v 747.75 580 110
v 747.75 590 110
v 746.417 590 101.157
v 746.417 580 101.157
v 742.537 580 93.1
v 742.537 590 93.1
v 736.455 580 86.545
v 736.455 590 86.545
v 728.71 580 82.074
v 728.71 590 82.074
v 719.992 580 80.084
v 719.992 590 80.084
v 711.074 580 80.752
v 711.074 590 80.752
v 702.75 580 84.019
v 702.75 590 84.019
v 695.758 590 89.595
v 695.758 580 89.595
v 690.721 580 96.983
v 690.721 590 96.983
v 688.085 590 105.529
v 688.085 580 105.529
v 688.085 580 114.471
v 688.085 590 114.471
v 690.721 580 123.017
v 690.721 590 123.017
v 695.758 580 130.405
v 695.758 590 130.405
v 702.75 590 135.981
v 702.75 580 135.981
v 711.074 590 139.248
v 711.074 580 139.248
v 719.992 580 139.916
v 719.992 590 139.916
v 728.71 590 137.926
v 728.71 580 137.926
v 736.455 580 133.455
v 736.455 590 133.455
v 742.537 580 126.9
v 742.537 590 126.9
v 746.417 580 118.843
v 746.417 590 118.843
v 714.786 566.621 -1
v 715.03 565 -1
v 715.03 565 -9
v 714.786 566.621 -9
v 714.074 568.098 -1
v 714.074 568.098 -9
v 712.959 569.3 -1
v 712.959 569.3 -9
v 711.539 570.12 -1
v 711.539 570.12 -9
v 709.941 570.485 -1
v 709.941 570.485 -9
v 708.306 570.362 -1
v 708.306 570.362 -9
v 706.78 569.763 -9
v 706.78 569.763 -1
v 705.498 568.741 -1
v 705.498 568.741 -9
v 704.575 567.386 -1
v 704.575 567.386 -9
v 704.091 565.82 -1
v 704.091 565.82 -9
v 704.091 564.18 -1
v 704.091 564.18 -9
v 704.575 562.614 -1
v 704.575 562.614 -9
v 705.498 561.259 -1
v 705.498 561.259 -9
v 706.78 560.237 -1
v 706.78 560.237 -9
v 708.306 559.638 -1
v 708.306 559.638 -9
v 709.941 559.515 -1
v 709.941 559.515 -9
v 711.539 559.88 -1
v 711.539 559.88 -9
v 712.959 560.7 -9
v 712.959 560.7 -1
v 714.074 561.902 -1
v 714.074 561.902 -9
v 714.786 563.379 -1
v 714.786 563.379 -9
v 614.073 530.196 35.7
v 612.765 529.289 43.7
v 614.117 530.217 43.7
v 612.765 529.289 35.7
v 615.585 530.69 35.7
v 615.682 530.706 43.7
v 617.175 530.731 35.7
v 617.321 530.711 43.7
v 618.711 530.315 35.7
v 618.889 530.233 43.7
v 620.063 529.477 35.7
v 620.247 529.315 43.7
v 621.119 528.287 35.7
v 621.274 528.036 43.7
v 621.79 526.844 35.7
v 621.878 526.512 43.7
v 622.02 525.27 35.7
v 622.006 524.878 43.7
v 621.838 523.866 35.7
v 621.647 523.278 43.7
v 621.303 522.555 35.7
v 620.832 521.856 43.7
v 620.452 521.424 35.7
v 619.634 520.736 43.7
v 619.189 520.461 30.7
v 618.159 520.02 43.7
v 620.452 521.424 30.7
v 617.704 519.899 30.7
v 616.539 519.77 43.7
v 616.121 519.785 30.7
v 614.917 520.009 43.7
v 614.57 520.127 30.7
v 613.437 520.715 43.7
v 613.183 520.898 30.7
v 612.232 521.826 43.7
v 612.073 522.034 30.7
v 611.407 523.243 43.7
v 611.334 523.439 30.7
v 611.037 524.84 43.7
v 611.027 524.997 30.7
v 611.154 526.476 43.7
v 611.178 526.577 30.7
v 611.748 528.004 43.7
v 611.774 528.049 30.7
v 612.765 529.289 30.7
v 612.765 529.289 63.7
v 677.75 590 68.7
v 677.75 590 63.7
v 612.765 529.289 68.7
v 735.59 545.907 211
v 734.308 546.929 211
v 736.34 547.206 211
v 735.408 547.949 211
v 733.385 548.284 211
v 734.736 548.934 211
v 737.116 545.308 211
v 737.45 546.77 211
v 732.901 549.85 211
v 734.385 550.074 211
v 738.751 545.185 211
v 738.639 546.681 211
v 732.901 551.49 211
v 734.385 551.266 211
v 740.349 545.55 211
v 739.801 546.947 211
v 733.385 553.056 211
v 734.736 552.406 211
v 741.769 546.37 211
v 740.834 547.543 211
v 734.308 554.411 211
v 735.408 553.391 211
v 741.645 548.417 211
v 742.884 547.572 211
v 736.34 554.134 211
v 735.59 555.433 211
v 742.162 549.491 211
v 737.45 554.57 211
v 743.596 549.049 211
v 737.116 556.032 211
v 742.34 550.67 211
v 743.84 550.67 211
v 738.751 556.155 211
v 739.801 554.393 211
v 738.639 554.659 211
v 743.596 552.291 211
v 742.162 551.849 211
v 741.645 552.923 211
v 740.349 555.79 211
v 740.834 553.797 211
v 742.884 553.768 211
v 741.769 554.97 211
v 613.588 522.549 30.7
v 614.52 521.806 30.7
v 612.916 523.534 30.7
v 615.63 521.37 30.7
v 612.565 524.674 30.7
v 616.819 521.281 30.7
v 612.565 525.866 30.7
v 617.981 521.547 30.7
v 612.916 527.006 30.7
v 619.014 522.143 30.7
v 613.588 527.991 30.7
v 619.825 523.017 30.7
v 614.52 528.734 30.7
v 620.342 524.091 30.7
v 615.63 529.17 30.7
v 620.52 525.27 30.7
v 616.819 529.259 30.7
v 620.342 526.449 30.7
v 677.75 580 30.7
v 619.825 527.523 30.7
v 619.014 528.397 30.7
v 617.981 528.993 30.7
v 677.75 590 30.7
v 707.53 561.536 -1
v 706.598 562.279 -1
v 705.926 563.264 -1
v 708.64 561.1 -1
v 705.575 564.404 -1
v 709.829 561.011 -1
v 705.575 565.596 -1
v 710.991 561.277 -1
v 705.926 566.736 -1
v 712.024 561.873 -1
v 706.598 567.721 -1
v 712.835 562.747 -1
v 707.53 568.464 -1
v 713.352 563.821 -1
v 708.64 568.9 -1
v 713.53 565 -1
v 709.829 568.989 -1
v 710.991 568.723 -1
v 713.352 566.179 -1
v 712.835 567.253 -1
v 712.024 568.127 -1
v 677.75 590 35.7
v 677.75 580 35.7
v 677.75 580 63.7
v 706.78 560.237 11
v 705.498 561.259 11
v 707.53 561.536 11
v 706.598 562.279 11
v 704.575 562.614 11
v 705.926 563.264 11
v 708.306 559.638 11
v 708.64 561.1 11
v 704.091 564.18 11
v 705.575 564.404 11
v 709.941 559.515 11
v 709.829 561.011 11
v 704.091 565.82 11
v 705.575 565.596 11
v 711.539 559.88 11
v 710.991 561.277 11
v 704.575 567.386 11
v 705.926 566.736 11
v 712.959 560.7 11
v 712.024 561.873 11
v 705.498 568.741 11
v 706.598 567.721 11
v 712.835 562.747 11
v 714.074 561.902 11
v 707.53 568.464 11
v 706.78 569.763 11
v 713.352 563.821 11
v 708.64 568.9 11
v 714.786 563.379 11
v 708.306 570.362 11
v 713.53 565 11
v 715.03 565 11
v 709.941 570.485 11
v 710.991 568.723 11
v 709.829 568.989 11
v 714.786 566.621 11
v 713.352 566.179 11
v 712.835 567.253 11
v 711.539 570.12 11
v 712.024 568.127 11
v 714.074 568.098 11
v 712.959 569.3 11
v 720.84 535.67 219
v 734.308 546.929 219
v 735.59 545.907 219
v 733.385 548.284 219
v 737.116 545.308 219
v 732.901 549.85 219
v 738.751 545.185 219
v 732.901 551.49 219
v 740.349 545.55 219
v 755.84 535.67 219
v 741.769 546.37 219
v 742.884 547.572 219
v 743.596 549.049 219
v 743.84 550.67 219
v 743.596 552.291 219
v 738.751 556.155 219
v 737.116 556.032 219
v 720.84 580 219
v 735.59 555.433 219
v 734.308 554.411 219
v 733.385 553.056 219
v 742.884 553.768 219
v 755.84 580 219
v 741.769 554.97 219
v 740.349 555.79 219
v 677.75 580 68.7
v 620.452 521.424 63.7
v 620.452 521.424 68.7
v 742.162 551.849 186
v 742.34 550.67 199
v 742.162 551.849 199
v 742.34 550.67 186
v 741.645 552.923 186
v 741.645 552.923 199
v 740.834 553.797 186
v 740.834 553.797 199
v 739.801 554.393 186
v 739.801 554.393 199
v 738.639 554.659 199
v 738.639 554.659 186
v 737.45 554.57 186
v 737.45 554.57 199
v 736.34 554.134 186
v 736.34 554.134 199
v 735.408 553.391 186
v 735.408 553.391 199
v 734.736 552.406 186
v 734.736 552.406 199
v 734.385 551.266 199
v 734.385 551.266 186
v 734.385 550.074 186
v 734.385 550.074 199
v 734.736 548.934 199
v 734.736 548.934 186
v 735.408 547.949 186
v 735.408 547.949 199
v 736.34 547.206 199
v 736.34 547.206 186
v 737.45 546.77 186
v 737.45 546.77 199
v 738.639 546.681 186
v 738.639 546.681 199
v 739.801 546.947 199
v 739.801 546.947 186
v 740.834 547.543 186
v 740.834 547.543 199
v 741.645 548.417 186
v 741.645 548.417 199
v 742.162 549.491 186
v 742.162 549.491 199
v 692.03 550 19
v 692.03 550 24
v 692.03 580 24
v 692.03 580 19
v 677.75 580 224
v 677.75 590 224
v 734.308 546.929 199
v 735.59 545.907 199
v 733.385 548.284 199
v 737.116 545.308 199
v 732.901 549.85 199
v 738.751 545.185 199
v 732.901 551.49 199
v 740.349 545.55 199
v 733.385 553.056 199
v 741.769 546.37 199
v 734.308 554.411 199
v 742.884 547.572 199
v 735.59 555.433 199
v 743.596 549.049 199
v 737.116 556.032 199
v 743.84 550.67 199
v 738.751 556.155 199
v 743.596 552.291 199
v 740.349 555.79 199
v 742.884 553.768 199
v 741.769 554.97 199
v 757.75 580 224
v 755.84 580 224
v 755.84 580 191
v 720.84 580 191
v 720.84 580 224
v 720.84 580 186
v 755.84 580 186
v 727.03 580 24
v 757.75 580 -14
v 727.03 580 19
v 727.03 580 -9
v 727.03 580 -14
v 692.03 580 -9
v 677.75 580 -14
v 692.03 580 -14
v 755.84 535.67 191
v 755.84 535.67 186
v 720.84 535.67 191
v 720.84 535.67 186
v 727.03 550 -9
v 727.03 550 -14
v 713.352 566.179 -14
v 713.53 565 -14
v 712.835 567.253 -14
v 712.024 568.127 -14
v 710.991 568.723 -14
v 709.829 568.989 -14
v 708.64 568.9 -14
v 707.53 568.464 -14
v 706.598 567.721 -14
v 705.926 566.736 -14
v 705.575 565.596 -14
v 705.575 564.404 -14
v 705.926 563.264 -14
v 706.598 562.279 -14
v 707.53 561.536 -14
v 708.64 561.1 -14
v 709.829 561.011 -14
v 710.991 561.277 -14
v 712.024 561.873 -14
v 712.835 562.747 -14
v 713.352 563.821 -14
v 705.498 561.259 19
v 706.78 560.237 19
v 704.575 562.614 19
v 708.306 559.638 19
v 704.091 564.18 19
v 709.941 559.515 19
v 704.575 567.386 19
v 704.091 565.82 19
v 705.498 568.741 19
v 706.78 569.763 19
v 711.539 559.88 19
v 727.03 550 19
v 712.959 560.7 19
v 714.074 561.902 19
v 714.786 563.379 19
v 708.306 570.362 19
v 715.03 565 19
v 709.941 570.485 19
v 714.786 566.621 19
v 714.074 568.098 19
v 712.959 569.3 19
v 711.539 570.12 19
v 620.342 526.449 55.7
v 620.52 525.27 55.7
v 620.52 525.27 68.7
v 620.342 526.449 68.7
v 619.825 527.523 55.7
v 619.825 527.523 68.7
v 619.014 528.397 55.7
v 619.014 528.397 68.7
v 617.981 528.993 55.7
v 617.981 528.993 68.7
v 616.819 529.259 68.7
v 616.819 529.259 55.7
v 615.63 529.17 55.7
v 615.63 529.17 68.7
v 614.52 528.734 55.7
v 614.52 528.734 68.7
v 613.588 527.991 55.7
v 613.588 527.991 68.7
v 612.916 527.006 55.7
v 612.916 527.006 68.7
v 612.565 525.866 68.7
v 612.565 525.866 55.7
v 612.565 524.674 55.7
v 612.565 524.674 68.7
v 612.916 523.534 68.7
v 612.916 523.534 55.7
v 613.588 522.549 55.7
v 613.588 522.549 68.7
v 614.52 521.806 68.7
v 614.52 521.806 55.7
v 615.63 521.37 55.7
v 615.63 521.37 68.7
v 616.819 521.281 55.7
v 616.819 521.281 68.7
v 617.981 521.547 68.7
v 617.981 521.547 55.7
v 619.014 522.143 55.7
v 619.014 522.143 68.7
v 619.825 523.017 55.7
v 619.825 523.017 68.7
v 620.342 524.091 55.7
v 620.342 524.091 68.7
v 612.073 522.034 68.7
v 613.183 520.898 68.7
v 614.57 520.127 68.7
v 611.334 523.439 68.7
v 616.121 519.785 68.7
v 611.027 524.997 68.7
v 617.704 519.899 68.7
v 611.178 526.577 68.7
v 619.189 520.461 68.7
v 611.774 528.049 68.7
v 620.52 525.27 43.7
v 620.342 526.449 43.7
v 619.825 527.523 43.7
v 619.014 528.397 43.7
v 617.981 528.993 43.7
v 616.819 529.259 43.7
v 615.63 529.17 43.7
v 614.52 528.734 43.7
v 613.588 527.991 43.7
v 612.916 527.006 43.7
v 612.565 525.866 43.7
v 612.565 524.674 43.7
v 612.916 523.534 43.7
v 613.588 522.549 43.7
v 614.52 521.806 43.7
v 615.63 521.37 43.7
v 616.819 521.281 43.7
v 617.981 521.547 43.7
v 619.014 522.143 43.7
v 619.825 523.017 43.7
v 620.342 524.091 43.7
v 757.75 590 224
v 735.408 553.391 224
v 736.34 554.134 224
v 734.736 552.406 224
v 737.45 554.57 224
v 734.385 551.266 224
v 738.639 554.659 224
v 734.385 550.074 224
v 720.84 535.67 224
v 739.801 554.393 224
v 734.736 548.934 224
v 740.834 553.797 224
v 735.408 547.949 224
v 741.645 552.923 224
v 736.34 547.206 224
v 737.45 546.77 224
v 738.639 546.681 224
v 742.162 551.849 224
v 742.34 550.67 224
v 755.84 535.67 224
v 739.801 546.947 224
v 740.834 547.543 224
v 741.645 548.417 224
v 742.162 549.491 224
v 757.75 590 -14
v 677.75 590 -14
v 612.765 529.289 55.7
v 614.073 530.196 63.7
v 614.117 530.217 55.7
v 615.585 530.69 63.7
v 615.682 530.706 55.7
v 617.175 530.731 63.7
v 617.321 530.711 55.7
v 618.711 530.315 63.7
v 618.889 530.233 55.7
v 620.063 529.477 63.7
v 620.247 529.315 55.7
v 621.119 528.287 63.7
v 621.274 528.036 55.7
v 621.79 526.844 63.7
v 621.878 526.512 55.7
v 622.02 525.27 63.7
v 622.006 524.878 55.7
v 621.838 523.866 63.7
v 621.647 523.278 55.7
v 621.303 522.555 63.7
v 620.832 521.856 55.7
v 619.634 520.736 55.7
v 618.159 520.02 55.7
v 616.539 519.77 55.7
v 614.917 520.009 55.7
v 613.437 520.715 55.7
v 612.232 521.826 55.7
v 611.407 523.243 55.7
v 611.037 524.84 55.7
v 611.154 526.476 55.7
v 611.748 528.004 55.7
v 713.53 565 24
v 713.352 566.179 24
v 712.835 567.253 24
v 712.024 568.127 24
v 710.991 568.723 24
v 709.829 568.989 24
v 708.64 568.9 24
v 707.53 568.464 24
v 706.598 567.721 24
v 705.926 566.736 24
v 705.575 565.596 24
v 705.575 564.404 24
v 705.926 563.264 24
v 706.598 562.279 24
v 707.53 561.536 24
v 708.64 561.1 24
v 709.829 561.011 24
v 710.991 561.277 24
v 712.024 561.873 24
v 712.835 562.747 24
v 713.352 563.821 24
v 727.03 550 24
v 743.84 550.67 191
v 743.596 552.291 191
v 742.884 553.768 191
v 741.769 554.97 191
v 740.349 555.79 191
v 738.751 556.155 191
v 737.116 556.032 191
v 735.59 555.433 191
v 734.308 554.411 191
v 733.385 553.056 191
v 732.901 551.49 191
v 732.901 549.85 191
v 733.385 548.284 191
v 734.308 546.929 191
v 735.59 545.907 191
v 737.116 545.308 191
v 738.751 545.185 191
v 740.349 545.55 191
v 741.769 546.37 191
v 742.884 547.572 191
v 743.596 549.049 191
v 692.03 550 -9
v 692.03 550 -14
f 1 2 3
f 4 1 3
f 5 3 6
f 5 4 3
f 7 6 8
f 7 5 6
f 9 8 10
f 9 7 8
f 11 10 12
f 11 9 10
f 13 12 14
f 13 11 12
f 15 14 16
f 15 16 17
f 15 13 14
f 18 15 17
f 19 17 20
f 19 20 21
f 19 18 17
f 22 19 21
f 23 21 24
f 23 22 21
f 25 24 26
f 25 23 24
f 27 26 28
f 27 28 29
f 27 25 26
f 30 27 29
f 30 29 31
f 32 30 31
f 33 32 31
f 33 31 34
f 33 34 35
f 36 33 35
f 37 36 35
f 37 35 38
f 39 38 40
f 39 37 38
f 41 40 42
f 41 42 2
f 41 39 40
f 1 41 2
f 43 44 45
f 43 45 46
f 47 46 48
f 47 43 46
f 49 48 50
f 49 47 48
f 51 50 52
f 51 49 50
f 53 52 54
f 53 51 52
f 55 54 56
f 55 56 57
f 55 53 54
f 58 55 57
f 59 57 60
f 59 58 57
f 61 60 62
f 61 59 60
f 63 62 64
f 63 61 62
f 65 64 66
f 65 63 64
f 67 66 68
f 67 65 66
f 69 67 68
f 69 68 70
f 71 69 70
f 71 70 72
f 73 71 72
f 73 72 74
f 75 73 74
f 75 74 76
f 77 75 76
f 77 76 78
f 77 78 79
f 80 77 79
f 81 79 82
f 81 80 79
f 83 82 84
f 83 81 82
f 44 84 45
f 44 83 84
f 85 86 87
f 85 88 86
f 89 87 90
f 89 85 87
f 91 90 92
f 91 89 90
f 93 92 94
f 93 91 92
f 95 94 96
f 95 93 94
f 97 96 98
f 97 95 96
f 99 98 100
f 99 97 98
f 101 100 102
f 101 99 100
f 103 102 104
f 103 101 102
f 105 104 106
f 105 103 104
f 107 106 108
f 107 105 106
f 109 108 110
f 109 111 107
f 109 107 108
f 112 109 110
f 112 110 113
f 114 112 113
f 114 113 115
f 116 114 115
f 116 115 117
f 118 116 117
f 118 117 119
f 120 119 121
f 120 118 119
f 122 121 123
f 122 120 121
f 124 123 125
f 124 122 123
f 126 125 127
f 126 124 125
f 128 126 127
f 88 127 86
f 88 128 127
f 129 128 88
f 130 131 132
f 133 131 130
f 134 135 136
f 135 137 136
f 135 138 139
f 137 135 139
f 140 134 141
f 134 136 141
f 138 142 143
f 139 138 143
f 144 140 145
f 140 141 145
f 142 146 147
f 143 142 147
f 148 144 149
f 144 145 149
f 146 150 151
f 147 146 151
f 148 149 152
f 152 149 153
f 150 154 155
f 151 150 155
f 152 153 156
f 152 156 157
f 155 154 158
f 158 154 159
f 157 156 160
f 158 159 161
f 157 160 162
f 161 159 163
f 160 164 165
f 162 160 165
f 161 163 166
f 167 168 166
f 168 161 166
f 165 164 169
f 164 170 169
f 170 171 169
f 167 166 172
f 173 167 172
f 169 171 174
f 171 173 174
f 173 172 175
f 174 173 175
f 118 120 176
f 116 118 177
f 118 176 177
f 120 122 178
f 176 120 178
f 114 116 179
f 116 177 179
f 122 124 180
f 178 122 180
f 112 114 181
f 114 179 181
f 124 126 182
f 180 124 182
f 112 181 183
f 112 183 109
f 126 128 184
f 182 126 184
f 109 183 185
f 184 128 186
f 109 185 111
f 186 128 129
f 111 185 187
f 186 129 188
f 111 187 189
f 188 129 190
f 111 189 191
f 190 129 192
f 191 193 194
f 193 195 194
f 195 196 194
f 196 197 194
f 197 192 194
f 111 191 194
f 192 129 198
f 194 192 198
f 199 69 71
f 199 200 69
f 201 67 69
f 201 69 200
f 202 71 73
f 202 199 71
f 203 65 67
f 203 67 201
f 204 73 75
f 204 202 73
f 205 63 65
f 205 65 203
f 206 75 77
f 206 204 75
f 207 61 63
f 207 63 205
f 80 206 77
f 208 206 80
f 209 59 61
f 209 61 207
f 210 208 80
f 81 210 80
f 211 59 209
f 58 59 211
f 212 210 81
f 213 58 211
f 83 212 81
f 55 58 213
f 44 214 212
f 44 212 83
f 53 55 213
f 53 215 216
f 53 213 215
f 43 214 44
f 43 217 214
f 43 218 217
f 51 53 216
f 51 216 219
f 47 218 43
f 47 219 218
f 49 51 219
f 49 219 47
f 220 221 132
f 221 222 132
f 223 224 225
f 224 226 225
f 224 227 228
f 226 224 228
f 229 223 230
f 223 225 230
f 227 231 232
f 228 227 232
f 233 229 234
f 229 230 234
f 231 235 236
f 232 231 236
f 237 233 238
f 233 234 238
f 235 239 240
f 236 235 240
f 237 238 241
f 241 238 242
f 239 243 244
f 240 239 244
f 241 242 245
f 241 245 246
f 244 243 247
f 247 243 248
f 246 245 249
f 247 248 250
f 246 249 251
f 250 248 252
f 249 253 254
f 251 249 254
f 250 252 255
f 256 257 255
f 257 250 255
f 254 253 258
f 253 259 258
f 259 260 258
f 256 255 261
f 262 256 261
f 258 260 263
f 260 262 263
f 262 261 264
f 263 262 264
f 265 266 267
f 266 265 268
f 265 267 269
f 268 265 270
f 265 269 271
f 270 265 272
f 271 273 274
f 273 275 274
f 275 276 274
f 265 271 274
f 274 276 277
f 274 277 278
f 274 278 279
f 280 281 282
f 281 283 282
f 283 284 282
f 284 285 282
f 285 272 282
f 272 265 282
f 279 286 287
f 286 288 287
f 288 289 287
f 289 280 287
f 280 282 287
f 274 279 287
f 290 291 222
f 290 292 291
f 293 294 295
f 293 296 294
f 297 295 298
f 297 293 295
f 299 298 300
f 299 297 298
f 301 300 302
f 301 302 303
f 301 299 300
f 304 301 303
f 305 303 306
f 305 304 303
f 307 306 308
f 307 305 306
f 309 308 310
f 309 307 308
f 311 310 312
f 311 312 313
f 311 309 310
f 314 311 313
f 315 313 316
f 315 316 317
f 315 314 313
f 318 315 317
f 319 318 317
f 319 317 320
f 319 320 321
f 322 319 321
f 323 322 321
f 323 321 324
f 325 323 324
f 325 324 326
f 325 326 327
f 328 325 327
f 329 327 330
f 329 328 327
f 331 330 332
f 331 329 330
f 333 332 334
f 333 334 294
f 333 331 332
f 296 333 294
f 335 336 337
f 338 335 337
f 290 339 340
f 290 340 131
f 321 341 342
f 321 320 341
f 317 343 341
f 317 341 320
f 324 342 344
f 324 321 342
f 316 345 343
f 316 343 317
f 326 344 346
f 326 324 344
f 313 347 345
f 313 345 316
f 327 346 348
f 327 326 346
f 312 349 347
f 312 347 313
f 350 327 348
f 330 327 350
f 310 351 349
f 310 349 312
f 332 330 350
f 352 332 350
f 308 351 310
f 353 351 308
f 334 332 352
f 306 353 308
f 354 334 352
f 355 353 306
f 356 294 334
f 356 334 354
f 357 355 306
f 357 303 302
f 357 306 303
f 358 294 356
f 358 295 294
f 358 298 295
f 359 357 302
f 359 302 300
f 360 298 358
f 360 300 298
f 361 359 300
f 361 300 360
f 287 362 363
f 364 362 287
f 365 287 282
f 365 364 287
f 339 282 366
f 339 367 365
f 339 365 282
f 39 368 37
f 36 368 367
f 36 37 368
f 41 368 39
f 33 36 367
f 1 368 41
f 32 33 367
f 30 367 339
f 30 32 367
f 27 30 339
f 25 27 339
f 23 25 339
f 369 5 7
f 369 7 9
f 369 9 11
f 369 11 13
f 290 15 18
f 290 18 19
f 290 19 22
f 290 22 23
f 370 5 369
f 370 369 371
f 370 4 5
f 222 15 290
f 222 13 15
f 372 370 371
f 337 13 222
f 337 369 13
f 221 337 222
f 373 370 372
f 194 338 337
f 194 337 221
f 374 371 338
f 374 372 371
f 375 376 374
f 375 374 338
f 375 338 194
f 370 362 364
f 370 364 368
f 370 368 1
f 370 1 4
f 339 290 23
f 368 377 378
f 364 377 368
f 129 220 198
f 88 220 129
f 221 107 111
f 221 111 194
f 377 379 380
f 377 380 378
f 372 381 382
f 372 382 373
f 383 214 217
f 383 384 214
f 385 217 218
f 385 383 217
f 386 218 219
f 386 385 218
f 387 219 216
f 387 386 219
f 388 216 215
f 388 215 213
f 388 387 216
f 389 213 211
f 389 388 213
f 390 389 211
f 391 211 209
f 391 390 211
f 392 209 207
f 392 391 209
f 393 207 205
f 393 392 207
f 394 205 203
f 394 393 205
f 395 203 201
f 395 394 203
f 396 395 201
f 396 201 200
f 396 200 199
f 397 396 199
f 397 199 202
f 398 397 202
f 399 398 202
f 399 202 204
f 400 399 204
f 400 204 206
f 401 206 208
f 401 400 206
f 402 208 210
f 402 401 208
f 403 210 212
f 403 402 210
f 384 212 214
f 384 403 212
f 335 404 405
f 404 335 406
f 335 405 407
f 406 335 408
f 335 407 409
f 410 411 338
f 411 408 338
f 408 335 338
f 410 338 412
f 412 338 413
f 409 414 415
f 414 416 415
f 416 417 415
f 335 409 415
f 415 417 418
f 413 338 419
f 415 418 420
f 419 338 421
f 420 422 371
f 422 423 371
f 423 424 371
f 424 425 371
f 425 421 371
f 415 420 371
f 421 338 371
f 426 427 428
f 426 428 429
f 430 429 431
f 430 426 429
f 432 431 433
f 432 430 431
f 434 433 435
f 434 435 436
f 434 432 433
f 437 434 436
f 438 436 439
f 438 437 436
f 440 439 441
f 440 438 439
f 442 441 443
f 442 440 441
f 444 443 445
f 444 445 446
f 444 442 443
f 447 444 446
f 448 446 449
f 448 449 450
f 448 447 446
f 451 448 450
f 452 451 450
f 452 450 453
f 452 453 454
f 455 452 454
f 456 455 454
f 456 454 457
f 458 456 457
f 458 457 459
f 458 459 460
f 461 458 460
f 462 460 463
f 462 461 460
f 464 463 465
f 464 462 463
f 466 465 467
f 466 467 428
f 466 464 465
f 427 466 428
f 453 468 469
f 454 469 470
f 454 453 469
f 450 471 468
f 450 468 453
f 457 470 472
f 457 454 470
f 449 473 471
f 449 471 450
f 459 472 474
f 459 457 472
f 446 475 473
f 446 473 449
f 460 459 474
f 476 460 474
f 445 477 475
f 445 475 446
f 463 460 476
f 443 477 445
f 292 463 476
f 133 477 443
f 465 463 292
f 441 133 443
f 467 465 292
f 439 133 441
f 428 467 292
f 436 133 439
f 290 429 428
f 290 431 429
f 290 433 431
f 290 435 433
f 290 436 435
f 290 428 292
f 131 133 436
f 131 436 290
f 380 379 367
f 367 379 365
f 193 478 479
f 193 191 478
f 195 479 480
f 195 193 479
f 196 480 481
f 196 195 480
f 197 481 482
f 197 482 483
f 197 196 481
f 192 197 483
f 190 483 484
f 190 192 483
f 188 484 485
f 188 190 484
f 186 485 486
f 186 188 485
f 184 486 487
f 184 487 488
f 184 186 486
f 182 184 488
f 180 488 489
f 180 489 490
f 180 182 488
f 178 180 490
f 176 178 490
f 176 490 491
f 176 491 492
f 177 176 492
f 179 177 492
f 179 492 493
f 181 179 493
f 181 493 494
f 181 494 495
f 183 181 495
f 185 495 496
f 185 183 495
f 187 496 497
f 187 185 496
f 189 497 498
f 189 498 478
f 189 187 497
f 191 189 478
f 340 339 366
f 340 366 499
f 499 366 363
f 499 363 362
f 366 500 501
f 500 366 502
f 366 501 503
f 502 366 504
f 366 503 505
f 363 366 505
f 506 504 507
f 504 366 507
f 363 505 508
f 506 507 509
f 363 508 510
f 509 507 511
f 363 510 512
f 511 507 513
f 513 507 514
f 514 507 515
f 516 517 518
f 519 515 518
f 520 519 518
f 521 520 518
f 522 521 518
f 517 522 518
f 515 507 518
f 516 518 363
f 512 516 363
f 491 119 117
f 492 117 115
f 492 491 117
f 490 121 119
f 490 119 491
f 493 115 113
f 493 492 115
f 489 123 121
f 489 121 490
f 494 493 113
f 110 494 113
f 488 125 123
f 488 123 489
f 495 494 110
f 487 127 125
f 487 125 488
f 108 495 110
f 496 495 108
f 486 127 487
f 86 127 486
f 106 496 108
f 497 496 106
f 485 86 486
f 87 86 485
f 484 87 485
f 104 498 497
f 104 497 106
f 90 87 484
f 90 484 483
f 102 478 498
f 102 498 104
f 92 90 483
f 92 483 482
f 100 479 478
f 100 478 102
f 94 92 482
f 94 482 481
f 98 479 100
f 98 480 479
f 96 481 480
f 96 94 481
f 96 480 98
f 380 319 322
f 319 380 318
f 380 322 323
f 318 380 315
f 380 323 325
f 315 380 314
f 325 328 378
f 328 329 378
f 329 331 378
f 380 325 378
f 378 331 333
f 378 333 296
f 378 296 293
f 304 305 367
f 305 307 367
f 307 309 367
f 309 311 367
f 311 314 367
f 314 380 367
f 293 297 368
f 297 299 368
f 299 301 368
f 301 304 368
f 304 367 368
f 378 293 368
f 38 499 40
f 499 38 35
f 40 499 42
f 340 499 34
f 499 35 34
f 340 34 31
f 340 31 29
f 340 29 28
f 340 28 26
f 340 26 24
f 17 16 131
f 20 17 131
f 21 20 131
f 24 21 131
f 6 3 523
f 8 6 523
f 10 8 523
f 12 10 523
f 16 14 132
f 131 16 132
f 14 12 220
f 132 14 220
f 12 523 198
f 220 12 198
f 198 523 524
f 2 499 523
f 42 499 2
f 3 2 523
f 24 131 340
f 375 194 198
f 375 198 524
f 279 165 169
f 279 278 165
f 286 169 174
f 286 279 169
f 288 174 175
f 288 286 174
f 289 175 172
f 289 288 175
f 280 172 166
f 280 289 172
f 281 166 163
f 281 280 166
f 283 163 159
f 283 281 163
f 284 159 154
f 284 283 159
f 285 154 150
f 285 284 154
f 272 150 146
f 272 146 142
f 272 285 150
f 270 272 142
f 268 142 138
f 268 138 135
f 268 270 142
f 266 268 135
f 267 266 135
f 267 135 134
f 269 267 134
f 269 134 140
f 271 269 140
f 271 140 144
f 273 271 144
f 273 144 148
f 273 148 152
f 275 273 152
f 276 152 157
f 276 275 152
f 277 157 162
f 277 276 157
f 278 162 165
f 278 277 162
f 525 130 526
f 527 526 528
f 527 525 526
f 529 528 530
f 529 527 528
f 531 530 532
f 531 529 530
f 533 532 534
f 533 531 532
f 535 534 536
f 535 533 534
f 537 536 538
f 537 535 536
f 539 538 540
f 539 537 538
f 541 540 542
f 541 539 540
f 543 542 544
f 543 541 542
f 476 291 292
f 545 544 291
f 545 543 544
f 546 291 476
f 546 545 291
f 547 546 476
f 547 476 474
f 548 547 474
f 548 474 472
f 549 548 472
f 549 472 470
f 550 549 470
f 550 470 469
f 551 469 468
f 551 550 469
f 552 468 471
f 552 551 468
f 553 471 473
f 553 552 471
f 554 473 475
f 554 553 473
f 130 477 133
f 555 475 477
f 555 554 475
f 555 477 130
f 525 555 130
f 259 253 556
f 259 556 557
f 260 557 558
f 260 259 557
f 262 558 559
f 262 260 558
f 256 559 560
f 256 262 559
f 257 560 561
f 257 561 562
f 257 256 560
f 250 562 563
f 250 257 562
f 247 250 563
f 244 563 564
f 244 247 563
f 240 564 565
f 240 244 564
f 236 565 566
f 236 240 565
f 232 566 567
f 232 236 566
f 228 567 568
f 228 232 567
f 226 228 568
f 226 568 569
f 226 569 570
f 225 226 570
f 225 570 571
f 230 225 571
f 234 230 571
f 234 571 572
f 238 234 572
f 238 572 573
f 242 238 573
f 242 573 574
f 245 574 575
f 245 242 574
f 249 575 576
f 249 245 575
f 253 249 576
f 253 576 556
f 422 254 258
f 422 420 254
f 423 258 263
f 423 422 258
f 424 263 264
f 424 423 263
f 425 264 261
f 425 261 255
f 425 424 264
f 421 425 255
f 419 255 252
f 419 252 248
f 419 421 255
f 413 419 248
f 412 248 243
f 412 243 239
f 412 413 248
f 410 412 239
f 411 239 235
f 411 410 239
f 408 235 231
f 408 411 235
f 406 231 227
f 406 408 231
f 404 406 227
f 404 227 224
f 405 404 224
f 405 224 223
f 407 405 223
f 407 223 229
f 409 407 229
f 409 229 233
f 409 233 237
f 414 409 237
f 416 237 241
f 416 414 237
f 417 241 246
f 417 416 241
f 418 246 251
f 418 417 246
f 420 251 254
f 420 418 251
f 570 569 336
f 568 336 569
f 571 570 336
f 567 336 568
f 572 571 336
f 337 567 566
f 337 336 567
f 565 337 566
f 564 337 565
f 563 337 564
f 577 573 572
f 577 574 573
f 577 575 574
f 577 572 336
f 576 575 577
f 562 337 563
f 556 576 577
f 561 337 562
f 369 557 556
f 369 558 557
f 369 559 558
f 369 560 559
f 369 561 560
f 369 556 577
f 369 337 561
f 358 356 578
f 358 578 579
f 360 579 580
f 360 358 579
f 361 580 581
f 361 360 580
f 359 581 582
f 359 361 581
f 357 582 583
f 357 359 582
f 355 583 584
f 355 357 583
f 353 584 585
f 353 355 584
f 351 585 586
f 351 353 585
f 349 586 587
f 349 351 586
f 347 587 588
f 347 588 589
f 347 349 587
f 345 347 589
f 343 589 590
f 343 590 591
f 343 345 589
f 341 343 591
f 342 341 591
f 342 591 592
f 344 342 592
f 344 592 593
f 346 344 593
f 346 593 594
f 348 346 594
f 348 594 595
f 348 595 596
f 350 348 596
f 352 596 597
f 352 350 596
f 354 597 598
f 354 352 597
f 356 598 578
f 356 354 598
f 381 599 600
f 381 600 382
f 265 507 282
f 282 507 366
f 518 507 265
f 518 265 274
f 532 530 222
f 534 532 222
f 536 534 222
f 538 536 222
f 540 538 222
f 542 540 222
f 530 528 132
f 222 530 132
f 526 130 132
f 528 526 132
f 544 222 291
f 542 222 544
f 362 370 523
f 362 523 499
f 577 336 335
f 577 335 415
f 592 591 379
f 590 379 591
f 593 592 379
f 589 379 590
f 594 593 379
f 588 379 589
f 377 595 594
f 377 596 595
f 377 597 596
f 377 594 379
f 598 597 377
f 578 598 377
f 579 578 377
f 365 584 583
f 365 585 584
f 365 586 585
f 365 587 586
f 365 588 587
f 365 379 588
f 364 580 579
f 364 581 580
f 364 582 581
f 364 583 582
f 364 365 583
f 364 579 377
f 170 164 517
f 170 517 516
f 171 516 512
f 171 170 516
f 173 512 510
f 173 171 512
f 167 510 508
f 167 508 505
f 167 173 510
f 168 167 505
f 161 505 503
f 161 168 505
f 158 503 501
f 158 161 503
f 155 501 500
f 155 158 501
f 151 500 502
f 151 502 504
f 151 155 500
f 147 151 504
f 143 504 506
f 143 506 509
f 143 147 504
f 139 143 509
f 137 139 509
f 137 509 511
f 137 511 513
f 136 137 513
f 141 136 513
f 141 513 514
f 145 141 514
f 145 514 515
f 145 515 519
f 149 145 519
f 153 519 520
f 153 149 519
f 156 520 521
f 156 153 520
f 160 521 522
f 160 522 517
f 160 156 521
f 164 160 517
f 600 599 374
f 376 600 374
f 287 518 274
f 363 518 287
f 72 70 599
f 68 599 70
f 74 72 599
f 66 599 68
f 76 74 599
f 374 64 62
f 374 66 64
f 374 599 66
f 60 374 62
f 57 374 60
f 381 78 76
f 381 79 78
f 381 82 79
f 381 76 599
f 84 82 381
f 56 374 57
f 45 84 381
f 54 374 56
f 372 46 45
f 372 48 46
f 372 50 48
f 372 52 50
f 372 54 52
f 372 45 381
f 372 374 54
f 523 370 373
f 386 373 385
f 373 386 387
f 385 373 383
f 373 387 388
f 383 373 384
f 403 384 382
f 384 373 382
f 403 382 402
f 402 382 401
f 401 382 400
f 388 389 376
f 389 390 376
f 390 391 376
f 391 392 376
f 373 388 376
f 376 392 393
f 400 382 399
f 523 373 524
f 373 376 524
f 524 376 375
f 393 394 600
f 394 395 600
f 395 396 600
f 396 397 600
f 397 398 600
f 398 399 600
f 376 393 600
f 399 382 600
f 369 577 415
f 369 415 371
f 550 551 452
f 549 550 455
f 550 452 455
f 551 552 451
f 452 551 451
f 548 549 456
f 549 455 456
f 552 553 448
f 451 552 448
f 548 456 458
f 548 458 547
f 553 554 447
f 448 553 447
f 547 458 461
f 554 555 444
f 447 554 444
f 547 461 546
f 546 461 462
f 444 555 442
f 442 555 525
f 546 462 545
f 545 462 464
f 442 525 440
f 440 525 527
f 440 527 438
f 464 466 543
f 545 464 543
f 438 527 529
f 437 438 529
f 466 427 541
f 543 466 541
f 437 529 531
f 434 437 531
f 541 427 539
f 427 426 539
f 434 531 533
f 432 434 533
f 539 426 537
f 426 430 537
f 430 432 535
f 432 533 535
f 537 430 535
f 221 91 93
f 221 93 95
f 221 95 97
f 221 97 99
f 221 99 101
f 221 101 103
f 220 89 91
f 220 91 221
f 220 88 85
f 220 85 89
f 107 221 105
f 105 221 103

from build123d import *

# Parameters (mm, degrees)
SKETCH1_R                = 30
SKETCH1_W                = 35
SKETCH1_H                = 5
SKETCH1_H_2              = 28
BOSS_EXTRUDE1_DEPTH      = 10
SKETCH2_W                = 35
SKETCH2_H                = 44.33
SKETCH2_R                = 5.5
BOSS_EXTRUDE2_DEPTH      = 19
BOSS_EXTRUDE2_DEPTH_BACK = 19
SKETCH2_4_R              = 4
SKETCH2_4_W              = 35
SKETCH2_4_H              = 44.33
SKETCH2_4_R_2            = 5.5
CUT_EXTRUDE1_DEPTH       = 14
SKETCH3_W                = 35
SKETCH3_H                = 30
SKETCH3_R                = 5.5
BOSS_EXTRUDE3_DEPTH      = 19
SKETCH3_3_R              = 4
SKETCH3_3_W              = 35
SKETCH3_3_H              = 30
SKETCH3_3_R_2            = 5.5
CUT_EXTRUDE2_DEPTH       = 14
SKETCH2_5_R              = 5.5
SKETCH2_5_R_2            = 4
BOSS_EXTRUDE4_DEPTH      = 19
SKETCH2_6_R              = 5.5
SKETCH2_6_R_2            = 4
CUT_EXTRUDE3_DEPTH       = 6
SKETCH3_4_R              = 5.5
SKETCH3_4_R_2            = 4
BOSS_EXTRUDE5_DEPTH      = 19
SKETCH3_5_R              = 5.5
SKETCH3_5_R_2            = 4
CUT_EXTRUDE4_DEPTH       = 6
SKETCH5_R                = 4
BOSS_EXTRUDE6_DEPTH      = 19
CUT_EXTRUDE5_DEPTH       = 14
SKETCH5_6_R              = 5.5
SKETCH5_6_R_2            = 4
CUT_EXTRUDE6_DEPTH       = 6


with BuildPart() as part:
    # Sketch1 → Boss-Extrude1 (new body)
    with BuildSketch(Plane(origin=(0, 580, 0), x_dir=(1, 0, 0), z_dir=(0, 1, 0))):
        Polygon((677.75, 14), (692.03, 14), (692.03, 9), (692.03, -19), (692.03, -24), (727.03, -24), (727.03, -19), (727.03, 9), (727.03, 14), (757.75, 14), (757.75, -224), (755.84, -224), (755.84, -219), (755.84, -191), (755.84, -186), (720.84, -186), (720.84, -191), (720.84, -219), (720.84, -224), (677.75, -224), align=None)
        with Locations((717.75, -110)):
            Circle(SKETCH1_R, mode=Mode.SUBTRACT)
        with Locations((709.53, 11.5)):
            Rectangle(SKETCH1_W, SKETCH1_H)
        with Locations((709.53, -5)):
            Rectangle(SKETCH1_W, SKETCH1_H_2)
        with Locations((709.53, -21.5)):
            Rectangle(SKETCH1_W, SKETCH1_H)
        with Locations((738.34, -188.5)):
            Rectangle(SKETCH1_W, SKETCH1_H)
        with Locations((738.34, -205)):
            Rectangle(SKETCH1_W, SKETCH1_H_2)
        with Locations((738.34, -221.5)):
            Rectangle(SKETCH1_W, SKETCH1_H)
    extrude(amount=BOSS_EXTRUDE1_DEPTH)

    # Sketch2 → Boss-Extrude2 (add, two sides)
    with BuildSketch(Plane.XY.offset(205)) as boss_extrude2_sk:
        with Locations((738.34, 557.835)):
            Rectangle(SKETCH2_W, SKETCH2_H)
        with Locations((738.34, 550.67)):
            Circle(SKETCH2_R, mode=Mode.SUBTRACT)
    extrude(amount=BOSS_EXTRUDE2_DEPTH)
    extrude(boss_extrude2_sk.sketch, amount=-BOSS_EXTRUDE2_DEPTH_BACK)

    # Sketch2<4> → Cut-Extrude1 (cut, symmetric)
    with BuildSketch(Plane.XY.offset(205)):
        with Locations((738.34, 550.67)):
            Circle(SKETCH2_4_R)
        with Locations((738.34, 557.835)):
            Rectangle(SKETCH2_4_W, SKETCH2_4_H)
        with Locations((738.34, 550.67)):
            Circle(SKETCH2_4_R_2, mode=Mode.SUBTRACT)
    extrude(amount=CUT_EXTRUDE1_DEPTH, both=True, mode=Mode.SUBTRACT)

    # Sketch3 → Boss-Extrude3 (add, symmetric)
    with BuildSketch(Plane.XY.offset(5)):
        with Locations((709.53, 565)):
            Rectangle(SKETCH3_W, SKETCH3_H)
        with Locations((709.53, 565)):
            Circle(SKETCH3_R, mode=Mode.SUBTRACT)
    extrude(amount=BOSS_EXTRUDE3_DEPTH, both=True)

    # Sketch3<3> → Cut-Extrude2 (cut, symmetric)
    with BuildSketch(Plane.XY.offset(5)):
        with Locations((709.53, 565)):
            Circle(SKETCH3_3_R)
        with Locations((709.53, 565)):
            Rectangle(SKETCH3_3_W, SKETCH3_3_H)
        with Locations((709.53, 565)):
            Circle(SKETCH3_3_R_2, mode=Mode.SUBTRACT)
    extrude(amount=CUT_EXTRUDE2_DEPTH, both=True, mode=Mode.SUBTRACT)

    # Sketch2<5> → Boss-Extrude4 (add, symmetric)
    with BuildSketch(Plane.XY.offset(205)):
        with Locations((738.34, 550.67)):
            Circle(SKETCH2_5_R)
        with Locations((738.34, 550.67)):
            Circle(SKETCH2_5_R_2, mode=Mode.SUBTRACT)
    extrude(amount=BOSS_EXTRUDE4_DEPTH, both=True)

    # Sketch2<6> → Cut-Extrude3 (cut, symmetric)
    with BuildSketch(Plane.XY.offset(205)):
        with Locations((738.34, 550.67)):
            Circle(SKETCH2_6_R)
        with Locations((738.34, 550.67)):
            Circle(SKETCH2_6_R_2, mode=Mode.SUBTRACT)
    extrude(amount=CUT_EXTRUDE3_DEPTH, both=True, mode=Mode.SUBTRACT)

    # Sketch3<4> → Boss-Extrude5 (add, symmetric)
    with BuildSketch(Plane.XY.offset(5)):
        with Locations((709.53, 565)):
            Circle(SKETCH3_4_R)
        with Locations((709.53, 565)):
            Circle(SKETCH3_4_R_2, mode=Mode.SUBTRACT)
    extrude(amount=BOSS_EXTRUDE5_DEPTH, both=True)

    # Sketch3<5> → Cut-Extrude4 (cut, symmetric)
    with BuildSketch(Plane.XY.offset(5)):
        with Locations((709.53, 565)):
            Circle(SKETCH3_5_R)
        with Locations((709.53, 565)):
            Circle(SKETCH3_5_R_2, mode=Mode.SUBTRACT)
    extrude(amount=CUT_EXTRUDE4_DEPTH, both=True, mode=Mode.SUBTRACT)

    # Sketch5 → Boss-Extrude6 (add, symmetric)
    with BuildSketch(Plane.XY.offset(49.7)):
        with BuildLine():
            Line((677.75, 580), (677.75, 590))
            Line((677.75, 590), (612.765312184, 529.288994825))
            ThreePointArc((612.765312184, 529.288994825), (612.586521385, 521.425816604), (620.451731788, 521.424030013))
            Line((620.451731788, 521.424030013), (677.75, 580))
        make_face()
        with Locations((616.52, 525.27)):
            Circle(SKETCH5_R, mode=Mode.SUBTRACT)
    extrude(amount=BOSS_EXTRUDE6_DEPTH, both=True)

    # Sketch5<5> → Cut-Extrude5 (cut, symmetric)
    with BuildSketch(Plane.XY.offset(49.7)):
        with BuildLine():
            Line((677.75, 580), (677.75, 590))
            Line((677.75, 590), (612.765312184, 529.288994825))
            ThreePointArc((612.765312184, 529.288994825), (618.710800882, 530.314838104), (622.02, 525.27))
            ThreePointArc((622.02, 525.27), (621.612863872, 523.193286832), (620.451731788, 521.424030013))
            Line((620.451731788, 521.424030013), (677.75, 580))
        make_face()
    extrude(amount=CUT_EXTRUDE5_DEPTH, both=True, mode=Mode.SUBTRACT)

    # Sketch5<6> → Cut-Extrude6 (cut, symmetric)
    with BuildSketch(Plane.XY.offset(49.7)):
        with Locations((616.52, 525.27)):
            Circle(SKETCH5_6_R)
        with Locations((616.52, 525.27)):
            Circle(SKETCH5_6_R_2, mode=Mode.SUBTRACT)
    extrude(amount=CUT_EXTRUDE6_DEPTH, both=True, mode=Mode.SUBTRACT)


solid = part.part
